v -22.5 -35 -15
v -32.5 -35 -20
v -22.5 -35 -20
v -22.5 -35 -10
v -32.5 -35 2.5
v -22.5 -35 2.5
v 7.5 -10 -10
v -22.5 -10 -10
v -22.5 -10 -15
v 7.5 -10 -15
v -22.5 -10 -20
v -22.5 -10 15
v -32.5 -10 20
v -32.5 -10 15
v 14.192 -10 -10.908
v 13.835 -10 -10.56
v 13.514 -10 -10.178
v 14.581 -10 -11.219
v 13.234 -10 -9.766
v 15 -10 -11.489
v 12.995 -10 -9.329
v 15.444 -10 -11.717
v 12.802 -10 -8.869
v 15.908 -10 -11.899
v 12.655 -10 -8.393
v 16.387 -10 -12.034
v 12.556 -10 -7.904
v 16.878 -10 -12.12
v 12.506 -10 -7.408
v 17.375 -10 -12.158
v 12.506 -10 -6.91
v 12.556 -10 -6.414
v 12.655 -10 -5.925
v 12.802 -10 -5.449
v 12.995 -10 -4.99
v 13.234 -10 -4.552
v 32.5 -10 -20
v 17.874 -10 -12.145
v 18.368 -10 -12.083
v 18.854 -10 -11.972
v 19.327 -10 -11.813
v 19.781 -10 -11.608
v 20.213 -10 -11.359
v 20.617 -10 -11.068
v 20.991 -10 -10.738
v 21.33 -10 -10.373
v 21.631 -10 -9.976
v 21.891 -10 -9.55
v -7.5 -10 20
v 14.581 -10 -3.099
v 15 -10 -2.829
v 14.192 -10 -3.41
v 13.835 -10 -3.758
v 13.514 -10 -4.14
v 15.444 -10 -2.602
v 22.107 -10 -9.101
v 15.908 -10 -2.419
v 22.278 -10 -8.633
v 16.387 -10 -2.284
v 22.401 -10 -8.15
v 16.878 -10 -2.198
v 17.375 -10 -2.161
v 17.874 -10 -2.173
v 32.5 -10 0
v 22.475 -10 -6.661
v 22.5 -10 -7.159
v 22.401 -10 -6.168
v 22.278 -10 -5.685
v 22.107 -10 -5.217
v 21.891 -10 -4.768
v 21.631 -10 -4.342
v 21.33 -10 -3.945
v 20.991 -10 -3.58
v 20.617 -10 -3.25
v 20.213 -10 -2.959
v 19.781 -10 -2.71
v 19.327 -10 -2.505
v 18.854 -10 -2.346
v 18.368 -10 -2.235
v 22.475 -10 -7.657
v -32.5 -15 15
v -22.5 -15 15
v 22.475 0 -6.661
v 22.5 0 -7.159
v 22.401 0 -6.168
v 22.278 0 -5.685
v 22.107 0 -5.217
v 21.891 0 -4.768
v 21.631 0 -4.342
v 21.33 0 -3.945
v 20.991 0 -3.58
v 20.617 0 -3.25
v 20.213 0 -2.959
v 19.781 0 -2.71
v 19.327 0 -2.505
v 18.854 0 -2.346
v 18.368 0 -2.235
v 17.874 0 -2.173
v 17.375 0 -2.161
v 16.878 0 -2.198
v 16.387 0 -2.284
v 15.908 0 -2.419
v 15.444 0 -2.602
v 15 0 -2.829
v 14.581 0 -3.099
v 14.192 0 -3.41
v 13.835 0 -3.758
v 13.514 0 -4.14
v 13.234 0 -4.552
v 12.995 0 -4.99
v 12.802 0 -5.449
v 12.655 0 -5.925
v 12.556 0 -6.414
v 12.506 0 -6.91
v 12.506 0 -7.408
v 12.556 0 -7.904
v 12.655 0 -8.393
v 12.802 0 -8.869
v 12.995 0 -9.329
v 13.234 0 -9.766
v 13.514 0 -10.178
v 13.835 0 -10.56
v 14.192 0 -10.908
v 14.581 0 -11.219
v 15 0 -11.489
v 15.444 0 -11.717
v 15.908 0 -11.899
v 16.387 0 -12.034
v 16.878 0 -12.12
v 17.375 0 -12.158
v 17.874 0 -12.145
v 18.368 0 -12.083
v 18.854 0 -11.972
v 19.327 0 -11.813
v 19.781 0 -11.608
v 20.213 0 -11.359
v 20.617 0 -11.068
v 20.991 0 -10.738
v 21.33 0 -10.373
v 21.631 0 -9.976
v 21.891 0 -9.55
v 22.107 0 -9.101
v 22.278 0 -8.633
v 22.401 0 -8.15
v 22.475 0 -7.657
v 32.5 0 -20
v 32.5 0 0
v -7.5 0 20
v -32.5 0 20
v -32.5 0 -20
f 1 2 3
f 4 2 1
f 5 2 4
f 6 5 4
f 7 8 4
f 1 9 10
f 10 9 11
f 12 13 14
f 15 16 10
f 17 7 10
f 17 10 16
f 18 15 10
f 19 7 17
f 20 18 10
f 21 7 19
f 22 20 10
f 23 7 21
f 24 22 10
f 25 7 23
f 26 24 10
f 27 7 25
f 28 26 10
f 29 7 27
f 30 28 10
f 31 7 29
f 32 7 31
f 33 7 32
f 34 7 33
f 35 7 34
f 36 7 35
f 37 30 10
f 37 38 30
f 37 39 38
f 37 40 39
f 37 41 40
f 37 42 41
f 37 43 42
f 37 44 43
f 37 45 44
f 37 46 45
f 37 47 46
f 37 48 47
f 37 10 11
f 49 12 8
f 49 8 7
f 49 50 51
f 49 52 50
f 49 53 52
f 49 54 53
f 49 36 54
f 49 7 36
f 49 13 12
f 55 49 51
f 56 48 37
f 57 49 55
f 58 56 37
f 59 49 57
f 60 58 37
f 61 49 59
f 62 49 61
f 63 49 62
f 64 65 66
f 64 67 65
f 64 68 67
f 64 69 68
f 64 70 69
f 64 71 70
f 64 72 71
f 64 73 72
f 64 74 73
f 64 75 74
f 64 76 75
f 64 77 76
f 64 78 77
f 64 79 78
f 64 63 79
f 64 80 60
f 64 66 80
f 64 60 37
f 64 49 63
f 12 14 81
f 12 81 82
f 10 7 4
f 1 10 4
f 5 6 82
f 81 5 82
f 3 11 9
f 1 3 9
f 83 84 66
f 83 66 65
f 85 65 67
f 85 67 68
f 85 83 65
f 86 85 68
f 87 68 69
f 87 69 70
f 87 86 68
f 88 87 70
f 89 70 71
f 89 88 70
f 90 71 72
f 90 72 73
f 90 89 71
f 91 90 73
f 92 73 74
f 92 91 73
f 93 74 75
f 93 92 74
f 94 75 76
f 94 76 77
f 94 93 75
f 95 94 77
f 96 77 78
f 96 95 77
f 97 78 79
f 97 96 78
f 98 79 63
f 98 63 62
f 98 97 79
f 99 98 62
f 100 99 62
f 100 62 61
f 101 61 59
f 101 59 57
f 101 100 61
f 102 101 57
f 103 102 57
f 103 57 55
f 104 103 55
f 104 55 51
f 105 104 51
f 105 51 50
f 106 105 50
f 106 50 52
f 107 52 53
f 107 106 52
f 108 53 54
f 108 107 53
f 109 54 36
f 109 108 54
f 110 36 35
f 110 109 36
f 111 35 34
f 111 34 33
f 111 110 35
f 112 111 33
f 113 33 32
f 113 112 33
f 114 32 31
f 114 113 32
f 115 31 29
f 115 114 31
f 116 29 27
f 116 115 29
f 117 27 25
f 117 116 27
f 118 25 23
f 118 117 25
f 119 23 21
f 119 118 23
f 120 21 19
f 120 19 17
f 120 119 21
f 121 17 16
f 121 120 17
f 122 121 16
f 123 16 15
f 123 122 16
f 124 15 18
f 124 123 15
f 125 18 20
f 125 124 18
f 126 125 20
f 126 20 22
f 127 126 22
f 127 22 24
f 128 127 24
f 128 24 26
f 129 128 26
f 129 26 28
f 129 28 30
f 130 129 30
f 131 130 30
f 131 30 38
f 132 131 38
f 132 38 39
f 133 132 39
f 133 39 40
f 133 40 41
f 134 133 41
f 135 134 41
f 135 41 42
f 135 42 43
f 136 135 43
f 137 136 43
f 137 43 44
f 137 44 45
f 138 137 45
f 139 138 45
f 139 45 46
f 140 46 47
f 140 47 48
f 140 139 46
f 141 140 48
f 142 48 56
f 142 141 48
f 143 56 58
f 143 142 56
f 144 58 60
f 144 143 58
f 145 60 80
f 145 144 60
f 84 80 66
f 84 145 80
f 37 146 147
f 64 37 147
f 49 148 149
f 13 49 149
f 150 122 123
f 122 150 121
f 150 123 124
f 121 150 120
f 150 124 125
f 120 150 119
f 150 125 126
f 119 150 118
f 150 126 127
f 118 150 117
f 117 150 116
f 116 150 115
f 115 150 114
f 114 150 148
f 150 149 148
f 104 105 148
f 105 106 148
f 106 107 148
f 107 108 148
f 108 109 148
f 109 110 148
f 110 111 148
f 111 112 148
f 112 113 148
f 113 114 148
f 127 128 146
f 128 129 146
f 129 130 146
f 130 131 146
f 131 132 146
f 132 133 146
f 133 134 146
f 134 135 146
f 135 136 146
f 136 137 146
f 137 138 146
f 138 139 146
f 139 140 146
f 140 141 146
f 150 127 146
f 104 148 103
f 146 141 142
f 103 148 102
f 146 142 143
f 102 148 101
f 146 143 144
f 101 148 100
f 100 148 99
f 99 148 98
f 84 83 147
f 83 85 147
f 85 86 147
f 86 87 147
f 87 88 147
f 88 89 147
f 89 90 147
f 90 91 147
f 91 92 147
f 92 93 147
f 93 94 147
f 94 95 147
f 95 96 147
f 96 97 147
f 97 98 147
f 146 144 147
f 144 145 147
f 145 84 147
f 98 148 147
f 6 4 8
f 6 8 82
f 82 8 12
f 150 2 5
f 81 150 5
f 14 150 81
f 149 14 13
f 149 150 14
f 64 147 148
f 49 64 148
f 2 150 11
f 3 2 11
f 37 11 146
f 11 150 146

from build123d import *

# Parameters (mm, degrees)
F0_W     = 30
F0_H     = 5
F1_DEPTH = 35
F0_R     = 5
F2_DEPTH = 10
F0_W_2   = 10
F0_H_2   = 15
F3_DEPTH = 35
F5_DEPTH = 10.001
F7_DEPTH = 10.001


with BuildPart() as f1:
    # F0 (on Front) → F1 (new body)
    with BuildSketch(Plane.XZ):
        Polygon((-32.5, -20), (-22.5, -20), (-22.5, -15), (-22.5, -10), (-22.5, 0), (-32.5, 0), align=None)
        with Locations((-7.5, -12.5)):
            Rectangle(F0_W, F0_H)
    extrude(amount=F1_DEPTH)

    # F0 (on Front) → F2 (join)
    with BuildSketch(Plane.XZ):
        Polygon((32.5, 0), (-7.5, 20), (-32.5, 20), (-32.5, 15), (-22.5, 15), (-22.5, 0), (-22.5, -10), (7.5, -10), (7.5, -15), (-22.5, -15), (-22.5, -20), (32.5, -20), align=None)
        with Locations((17.5, -7.159092)):
            Circle(F0_R, mode=Mode.SUBTRACT)
    extrude(amount=F2_DEPTH)

    # F0 (on Front) → F3 (join)
    with BuildSketch(Plane.XZ):
        with Locations((-27.5, 7.5)):
            Rectangle(F0_W_2, F0_H_2)
    extrude(amount=F3_DEPTH)

    # F4 (on face) → F5 (cut, through all)
    with BuildSketch(Plane.XY.offset(-10)):
        Polygon((7.5, -10), (-22.5, -35), (7.5, -35), align=None)
    extrude(amount=-F5_DEPTH, mode=Mode.SUBTRACT)

    # F6 (on face) → F7 (cut, through all)
    with BuildSketch(Plane.YZ.offset(-22.5)):
        Polygon((-35, 15), (-35, 2.5), (-15, 15), align=None)
    extrude(amount=-F7_DEPTH, mode=Mode.SUBTRACT)


solid = f1.part
